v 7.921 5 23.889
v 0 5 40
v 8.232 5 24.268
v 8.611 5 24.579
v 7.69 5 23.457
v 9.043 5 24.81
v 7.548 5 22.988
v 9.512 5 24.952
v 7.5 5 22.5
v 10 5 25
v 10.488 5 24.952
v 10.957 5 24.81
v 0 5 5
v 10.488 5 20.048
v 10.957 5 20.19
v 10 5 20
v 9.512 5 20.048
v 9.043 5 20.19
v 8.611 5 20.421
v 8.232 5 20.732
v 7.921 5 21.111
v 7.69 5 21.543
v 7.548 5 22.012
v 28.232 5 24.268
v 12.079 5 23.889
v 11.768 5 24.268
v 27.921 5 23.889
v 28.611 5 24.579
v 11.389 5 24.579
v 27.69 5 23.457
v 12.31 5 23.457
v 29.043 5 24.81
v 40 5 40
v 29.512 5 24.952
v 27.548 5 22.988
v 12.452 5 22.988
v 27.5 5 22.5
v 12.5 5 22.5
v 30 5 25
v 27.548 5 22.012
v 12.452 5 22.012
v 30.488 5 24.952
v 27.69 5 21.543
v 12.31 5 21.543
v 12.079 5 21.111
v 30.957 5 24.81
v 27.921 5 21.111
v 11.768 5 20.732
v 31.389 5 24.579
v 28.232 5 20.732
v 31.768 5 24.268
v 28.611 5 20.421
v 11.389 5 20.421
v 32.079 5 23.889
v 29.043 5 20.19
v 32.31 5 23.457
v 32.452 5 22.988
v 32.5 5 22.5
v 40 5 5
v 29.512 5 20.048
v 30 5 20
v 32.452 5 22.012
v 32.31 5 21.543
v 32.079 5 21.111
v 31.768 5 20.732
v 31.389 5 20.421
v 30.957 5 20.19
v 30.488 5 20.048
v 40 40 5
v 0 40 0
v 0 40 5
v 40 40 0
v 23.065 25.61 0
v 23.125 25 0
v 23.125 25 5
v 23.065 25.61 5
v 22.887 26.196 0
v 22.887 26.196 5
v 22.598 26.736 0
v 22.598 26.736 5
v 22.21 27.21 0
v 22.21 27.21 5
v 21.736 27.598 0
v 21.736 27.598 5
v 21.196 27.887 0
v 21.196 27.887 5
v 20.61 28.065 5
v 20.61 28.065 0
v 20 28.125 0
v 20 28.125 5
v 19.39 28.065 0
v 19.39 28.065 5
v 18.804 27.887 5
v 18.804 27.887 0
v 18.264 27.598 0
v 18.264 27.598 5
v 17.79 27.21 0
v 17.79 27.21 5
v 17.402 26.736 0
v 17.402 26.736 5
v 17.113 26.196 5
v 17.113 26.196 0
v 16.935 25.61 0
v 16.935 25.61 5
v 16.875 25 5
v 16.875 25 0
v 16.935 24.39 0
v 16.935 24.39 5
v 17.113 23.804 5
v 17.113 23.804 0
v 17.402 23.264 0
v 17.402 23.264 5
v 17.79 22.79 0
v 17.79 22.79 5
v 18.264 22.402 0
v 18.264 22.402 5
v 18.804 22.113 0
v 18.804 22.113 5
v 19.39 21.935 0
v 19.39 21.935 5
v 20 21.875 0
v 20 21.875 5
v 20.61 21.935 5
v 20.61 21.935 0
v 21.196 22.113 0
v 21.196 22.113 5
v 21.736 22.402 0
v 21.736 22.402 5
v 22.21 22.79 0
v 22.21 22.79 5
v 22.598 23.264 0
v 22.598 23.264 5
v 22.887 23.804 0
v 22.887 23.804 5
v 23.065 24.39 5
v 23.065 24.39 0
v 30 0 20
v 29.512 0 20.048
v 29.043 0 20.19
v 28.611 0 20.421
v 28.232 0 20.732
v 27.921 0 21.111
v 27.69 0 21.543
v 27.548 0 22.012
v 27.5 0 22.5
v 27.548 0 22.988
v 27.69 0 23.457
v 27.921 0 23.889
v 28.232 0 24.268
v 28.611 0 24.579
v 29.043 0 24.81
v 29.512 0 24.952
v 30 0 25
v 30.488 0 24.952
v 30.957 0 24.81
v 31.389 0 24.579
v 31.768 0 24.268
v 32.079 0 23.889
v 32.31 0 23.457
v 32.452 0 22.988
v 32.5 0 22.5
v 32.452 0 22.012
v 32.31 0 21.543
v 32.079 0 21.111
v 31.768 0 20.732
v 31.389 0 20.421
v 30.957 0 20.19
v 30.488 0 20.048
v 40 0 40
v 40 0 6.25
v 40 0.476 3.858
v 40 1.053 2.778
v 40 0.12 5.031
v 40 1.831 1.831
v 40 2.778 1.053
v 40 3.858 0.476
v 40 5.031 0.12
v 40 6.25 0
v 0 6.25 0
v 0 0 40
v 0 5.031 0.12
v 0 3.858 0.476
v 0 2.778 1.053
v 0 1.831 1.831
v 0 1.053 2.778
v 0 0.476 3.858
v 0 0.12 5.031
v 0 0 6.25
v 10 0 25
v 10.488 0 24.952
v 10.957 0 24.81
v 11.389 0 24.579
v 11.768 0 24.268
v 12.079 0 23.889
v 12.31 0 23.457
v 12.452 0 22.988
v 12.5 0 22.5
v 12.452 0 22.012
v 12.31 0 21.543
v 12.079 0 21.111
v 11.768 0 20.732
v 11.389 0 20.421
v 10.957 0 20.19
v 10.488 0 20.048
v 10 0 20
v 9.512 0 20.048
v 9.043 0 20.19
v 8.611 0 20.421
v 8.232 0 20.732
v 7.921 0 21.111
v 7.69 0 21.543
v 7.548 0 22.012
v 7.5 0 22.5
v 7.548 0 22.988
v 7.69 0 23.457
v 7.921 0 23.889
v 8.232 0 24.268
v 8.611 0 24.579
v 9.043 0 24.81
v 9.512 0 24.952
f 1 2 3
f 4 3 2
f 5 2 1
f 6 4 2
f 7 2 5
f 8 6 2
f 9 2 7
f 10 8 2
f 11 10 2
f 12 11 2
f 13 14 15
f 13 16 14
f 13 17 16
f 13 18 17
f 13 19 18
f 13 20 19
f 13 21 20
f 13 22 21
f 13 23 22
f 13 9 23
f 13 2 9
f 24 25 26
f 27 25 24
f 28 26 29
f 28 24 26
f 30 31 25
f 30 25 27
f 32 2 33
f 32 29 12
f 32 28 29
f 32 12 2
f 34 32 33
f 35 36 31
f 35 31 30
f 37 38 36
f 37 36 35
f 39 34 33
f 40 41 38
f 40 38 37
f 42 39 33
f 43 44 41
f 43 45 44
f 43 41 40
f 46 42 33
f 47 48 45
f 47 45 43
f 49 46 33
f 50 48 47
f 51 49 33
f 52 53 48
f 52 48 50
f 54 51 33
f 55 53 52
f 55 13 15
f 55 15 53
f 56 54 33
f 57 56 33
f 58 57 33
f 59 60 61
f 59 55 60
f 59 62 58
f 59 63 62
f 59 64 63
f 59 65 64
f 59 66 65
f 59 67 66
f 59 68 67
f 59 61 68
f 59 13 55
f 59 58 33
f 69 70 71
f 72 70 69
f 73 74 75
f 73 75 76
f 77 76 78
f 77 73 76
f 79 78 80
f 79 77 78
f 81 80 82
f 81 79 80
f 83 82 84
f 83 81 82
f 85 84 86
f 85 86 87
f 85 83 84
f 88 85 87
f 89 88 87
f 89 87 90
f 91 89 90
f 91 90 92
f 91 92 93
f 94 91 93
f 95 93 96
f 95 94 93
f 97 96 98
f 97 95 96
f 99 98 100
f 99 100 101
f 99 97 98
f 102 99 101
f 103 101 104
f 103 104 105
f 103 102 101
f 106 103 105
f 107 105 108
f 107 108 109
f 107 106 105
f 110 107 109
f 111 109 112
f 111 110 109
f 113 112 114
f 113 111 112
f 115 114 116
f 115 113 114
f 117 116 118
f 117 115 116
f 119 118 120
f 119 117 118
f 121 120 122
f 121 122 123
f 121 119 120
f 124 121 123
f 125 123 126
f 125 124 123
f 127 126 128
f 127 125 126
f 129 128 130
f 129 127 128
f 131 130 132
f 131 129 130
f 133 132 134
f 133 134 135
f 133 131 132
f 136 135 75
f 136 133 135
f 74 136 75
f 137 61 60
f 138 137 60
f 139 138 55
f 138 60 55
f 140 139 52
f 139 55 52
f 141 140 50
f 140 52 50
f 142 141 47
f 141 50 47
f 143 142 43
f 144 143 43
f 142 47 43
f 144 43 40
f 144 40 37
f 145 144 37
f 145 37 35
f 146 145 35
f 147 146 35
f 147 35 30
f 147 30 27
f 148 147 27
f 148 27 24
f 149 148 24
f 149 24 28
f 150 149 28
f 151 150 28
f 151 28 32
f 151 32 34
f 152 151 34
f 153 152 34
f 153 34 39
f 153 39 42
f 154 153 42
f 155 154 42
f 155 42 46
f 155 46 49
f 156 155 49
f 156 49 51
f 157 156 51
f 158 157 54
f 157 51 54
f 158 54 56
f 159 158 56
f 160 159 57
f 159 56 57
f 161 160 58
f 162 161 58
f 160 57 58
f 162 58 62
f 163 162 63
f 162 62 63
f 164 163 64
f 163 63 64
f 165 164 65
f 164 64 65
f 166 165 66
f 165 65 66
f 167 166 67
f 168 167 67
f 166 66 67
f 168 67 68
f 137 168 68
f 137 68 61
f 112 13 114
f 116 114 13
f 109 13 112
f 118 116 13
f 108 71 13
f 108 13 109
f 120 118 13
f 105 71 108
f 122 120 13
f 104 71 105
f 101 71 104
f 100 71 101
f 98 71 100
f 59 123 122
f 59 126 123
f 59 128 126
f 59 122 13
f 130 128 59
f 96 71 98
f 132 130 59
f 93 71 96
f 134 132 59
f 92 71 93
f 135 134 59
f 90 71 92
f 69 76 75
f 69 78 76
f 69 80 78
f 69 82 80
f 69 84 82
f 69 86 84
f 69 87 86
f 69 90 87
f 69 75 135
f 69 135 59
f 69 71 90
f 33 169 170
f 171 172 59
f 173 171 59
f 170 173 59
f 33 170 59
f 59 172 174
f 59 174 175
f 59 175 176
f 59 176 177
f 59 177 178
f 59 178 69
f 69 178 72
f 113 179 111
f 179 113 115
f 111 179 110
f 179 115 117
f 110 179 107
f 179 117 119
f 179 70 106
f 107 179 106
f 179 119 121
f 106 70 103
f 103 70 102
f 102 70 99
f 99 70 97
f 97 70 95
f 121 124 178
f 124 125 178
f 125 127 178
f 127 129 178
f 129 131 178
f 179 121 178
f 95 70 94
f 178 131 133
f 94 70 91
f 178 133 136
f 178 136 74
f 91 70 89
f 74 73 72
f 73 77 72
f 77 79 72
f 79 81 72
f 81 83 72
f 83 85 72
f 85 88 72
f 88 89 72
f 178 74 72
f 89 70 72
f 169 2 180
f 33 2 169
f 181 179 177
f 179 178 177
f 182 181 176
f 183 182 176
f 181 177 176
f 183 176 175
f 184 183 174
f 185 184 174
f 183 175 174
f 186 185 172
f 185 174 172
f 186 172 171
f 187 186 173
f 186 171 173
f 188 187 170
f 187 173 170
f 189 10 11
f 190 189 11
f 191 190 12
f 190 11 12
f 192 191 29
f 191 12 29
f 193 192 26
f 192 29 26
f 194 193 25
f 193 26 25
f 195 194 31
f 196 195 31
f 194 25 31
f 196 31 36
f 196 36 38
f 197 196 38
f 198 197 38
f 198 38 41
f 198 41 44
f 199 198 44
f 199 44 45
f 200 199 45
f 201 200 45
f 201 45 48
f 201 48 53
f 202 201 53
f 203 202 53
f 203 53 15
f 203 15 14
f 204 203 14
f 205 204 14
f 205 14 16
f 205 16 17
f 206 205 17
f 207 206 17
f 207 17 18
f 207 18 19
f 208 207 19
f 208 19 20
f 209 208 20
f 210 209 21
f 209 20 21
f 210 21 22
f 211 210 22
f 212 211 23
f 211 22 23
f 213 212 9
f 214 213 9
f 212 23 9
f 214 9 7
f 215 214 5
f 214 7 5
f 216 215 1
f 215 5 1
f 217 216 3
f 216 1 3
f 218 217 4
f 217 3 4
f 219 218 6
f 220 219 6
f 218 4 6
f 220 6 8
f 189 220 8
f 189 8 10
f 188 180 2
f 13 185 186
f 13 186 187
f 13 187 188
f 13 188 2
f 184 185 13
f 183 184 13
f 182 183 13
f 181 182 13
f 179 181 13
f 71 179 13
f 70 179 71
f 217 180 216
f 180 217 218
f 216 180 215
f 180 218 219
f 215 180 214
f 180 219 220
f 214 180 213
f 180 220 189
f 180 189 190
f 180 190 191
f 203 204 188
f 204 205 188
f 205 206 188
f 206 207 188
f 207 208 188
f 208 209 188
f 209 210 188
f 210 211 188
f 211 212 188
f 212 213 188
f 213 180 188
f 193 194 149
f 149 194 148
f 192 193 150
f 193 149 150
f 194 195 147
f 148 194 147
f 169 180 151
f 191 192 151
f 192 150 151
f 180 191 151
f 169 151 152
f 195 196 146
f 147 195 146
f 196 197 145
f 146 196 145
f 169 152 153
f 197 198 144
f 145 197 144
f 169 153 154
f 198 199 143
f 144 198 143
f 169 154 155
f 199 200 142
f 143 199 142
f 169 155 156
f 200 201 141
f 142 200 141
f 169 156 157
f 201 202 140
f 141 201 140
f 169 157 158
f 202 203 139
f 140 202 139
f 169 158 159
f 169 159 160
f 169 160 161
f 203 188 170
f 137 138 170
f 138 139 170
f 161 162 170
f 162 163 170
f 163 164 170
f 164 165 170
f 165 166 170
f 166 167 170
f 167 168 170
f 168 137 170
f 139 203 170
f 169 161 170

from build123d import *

# Parameters (mm, degrees)
SKETCH1_W           = 40
SKETCH1_H           = 35
SKETCH1_R           = 3.125
BOSS_EXTRUDE1_DEPTH = 5
SKETCH1_3_W         = 40
SKETCH1_3_H         = 5
BOSS_EXTRUDE2_DEPTH = 40
FILLET1_R           = 6.25
SKETCH2_R           = 2.5
CUT_EXTRUDE1_DEPTH  = 67.520673478


with BuildPart() as part:
    # Sketch1 → Boss-Extrude1 (new body)
    with BuildSketch(Plane.XY):
        with Locations((20, 22.5)):
            Rectangle(SKETCH1_W, SKETCH1_H)
        with Locations((20, 25)):
            Circle(SKETCH1_R, mode=Mode.SUBTRACT)
    extrude(amount=BOSS_EXTRUDE1_DEPTH)

    # Sketch1<3> → Boss-Extrude2 (add)
    with BuildSketch(Plane.XY):
        with Locations((20, 2.5)):
            Rectangle(SKETCH1_3_W, SKETCH1_3_H)
    extrude(amount=BOSS_EXTRUDE2_DEPTH)

    # Fillet1
    fillet1_edges = [part.edges().sort_by_distance(p)[0] for p in [
        (20, 0, 0),
    ]]
    fillet(fillet1_edges, radius=FILLET1_R)

    # Sketch2 → Cut-Extrude1 (cut, through all)
    with BuildSketch(Plane(origin=(0, 5, 0), x_dir=(1, 0, 0), z_dir=(0, 1, 0))):
        with Locations((10, -22.5)):
            Circle(SKETCH2_R)
        with Locations((30, -22.5)):
            Circle(SKETCH2_R)
    extrude(amount=-CUT_EXTRUDE1_DEPTH, mode=Mode.SUBTRACT)


solid = part.part
